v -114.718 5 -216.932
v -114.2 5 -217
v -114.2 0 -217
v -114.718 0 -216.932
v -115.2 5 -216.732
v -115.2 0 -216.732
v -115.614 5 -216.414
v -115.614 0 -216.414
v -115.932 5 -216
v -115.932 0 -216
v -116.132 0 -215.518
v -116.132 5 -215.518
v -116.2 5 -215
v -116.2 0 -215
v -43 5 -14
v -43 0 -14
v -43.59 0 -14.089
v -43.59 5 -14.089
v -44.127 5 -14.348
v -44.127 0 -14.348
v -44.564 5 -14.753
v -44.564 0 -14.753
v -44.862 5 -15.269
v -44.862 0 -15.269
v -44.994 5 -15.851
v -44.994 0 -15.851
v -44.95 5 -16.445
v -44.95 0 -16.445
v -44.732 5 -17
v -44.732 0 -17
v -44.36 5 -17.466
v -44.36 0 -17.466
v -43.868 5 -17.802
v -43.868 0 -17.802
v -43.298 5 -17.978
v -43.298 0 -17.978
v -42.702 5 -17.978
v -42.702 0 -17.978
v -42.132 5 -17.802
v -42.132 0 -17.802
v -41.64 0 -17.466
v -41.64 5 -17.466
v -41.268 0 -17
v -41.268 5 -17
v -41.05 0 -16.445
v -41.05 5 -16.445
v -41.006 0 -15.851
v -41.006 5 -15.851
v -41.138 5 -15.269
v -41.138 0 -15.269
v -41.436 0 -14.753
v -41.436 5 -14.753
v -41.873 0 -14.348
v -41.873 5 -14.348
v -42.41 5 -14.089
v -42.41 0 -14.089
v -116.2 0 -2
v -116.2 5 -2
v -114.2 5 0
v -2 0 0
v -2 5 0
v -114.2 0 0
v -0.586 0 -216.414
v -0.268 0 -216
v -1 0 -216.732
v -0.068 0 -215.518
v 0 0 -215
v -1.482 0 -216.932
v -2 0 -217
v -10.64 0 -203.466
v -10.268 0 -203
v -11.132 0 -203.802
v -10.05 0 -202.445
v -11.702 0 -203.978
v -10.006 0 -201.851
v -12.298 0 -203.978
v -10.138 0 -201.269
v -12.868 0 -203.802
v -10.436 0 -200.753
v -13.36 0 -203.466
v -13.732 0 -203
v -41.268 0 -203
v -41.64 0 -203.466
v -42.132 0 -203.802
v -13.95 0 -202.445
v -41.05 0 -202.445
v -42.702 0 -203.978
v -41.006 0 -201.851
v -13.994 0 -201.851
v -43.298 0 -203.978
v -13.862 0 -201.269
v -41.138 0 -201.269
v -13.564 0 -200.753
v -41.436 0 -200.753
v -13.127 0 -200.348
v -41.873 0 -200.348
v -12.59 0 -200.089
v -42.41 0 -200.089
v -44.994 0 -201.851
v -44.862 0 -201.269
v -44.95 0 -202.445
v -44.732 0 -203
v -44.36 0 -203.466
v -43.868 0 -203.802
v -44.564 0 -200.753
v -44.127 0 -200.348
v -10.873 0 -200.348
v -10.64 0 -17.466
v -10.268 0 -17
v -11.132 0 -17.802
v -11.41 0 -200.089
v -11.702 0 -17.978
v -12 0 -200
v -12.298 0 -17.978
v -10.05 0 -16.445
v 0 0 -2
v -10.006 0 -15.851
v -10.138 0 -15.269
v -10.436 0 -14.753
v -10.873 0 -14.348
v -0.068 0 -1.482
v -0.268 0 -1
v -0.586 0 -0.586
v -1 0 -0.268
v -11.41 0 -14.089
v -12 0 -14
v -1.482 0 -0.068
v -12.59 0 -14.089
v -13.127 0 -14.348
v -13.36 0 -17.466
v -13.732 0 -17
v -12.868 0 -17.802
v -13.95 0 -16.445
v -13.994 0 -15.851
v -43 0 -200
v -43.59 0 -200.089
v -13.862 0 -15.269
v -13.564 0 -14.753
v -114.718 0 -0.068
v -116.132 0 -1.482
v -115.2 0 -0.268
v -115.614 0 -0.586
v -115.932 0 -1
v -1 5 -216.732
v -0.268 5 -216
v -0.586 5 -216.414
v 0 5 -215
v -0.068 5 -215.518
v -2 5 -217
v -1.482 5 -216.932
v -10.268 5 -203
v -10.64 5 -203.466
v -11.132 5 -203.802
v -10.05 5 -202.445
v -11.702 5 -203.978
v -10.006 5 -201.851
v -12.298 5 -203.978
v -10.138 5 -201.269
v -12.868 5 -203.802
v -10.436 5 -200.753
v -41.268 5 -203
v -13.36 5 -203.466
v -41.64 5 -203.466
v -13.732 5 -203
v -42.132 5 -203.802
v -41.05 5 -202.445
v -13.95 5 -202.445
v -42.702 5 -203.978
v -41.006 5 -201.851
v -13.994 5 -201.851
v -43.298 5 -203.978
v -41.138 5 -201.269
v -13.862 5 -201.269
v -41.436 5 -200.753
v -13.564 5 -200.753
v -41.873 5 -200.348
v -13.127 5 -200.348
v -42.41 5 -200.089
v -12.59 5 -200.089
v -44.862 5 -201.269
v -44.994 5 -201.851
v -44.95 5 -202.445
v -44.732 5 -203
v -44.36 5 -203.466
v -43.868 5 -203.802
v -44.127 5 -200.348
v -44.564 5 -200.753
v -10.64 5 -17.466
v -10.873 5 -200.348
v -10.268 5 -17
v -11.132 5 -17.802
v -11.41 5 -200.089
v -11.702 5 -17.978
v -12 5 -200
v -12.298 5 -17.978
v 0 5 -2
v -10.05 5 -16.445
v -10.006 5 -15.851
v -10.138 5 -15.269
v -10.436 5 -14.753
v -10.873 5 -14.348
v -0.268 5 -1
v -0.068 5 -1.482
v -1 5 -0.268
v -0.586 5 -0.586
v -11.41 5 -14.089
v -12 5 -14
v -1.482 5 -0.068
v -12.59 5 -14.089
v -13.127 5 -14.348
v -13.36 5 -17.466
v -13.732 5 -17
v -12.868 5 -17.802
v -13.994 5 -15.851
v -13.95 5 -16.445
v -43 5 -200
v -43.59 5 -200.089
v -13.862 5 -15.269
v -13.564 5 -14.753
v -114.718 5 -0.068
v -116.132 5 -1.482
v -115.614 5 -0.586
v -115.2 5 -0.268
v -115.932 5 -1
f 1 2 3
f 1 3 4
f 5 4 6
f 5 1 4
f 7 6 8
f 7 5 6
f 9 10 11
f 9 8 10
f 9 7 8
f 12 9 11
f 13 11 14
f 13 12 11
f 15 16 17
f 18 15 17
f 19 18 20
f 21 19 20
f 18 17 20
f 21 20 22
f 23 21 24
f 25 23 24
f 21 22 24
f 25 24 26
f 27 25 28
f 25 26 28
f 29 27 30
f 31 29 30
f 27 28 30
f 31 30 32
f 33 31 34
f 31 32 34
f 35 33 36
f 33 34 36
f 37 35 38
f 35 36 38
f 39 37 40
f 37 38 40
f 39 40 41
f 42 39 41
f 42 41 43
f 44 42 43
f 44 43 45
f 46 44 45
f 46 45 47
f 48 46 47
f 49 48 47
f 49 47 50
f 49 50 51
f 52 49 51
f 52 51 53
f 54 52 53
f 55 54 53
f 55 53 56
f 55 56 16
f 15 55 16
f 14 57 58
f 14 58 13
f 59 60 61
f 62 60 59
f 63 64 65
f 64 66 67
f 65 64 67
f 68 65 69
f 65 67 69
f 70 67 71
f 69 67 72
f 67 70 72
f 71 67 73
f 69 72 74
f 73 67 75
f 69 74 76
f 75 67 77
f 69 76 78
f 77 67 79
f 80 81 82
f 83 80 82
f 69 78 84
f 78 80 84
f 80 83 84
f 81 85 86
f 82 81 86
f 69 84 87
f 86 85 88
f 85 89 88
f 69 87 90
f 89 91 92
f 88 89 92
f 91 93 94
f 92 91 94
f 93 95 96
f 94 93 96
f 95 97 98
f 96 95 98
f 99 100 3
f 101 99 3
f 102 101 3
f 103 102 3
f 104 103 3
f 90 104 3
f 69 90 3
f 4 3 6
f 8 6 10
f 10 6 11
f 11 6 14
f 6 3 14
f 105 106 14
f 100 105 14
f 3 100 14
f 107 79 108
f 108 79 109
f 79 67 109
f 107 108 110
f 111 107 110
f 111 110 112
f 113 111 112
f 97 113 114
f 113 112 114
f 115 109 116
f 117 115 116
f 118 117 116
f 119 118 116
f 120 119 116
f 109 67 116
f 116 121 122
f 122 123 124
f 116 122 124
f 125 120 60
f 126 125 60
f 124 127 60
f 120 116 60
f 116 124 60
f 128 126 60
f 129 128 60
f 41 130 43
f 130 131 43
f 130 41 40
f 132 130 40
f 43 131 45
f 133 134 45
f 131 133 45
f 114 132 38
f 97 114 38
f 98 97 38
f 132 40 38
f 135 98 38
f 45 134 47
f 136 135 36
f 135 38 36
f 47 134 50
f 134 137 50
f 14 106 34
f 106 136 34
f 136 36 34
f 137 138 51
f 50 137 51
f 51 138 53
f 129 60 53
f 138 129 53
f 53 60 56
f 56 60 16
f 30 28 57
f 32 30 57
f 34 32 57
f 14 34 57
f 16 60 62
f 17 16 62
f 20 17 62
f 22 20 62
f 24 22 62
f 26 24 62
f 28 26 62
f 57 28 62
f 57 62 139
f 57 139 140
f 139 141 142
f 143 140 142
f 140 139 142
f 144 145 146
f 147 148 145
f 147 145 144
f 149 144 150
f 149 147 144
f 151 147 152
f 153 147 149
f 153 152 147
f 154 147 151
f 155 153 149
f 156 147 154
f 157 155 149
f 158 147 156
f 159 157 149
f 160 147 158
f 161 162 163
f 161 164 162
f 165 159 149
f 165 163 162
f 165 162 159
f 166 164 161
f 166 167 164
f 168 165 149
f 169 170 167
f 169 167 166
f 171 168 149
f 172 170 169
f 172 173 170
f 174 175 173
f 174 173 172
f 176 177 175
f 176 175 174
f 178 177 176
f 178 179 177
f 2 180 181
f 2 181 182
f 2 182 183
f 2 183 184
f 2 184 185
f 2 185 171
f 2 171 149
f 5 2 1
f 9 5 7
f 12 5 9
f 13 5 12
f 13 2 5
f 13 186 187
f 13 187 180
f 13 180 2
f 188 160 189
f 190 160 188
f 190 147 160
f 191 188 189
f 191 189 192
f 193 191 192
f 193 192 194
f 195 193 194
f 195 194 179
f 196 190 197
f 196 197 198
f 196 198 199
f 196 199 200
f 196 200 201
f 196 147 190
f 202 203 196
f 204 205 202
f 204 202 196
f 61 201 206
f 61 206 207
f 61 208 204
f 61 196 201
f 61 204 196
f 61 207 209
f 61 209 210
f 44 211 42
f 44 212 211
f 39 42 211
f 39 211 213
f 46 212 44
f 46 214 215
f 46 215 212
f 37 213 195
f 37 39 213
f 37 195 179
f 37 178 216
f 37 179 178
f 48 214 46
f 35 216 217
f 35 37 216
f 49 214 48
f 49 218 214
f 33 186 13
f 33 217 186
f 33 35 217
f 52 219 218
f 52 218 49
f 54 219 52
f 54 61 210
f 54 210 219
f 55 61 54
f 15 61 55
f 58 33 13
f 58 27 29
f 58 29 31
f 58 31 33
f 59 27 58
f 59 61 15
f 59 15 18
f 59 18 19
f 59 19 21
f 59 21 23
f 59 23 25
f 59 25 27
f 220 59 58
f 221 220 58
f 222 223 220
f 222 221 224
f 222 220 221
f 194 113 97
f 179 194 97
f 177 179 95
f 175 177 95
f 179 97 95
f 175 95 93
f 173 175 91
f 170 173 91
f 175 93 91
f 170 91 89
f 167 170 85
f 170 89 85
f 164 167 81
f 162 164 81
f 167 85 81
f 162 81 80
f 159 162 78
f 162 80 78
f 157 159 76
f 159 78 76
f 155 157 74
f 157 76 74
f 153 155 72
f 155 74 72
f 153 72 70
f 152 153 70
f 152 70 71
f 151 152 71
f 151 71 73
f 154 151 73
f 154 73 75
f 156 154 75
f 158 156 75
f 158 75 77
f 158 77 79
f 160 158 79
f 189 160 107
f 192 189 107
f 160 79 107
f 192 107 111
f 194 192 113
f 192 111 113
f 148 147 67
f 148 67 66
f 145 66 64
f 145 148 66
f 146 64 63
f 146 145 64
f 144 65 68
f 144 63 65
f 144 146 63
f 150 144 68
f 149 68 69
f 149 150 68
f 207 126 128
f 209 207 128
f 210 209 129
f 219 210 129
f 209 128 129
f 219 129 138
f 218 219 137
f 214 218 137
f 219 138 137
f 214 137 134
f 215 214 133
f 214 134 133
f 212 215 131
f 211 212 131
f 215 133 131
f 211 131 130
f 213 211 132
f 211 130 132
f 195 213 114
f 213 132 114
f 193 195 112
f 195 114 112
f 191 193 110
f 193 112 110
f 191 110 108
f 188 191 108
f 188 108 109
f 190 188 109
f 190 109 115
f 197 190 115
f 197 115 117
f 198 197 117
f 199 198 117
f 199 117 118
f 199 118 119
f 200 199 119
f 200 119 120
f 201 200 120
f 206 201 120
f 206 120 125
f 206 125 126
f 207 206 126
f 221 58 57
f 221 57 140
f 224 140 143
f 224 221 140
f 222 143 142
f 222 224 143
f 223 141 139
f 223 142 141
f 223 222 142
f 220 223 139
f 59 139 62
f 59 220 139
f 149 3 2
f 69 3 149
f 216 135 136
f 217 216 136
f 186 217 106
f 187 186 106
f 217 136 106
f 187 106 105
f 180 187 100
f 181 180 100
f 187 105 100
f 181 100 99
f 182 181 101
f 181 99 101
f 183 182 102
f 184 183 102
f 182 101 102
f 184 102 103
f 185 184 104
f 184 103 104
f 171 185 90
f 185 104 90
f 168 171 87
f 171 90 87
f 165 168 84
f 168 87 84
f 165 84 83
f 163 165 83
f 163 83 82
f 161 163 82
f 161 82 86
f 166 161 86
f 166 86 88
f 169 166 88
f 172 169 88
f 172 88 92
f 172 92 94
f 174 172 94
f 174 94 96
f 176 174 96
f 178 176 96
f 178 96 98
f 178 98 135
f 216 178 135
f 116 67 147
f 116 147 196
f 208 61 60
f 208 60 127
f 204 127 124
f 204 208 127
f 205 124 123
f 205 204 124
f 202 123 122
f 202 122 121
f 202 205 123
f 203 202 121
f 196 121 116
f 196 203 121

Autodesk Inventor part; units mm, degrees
ref_plane "YZ Plane" through (0, 0, 0) normal (1, 0, 0) x (0, 1, 0)
ref_plane "XZ Plane" through (0, 0, 0) normal (0, 1, 0) x (-1, 0, 0)
ref_plane "XY Plane" through (0, 0, 0) normal (0, 0, 1) x (1, 0, 0)
sketch "Sketch1" plane through (0, 0, 0) normal (0, 1, 0) x (-1, 0, 0)
  line L0 (0, 0) -> (111.2, 0)
  line L1 (116.2, 0) -> (116.2, -217)
  line L2 (116.2, -217) -> (0, -217)
  line L3 (0, -217) -> (0, 0)
  line L4 (111.2, 0) -> (111.2, 0)
  line L5 (111.2, 0) -> (116.2, 0)
  dimension "d4" = 5
  dimension "d5" = 111.2
  dimension "d6" = 217
  dimension "d7" = 217
extrude "Extrusion1" add sketch "Sketch1" along normal blind 5
fillet "Fillet1" radius 2 5 edges at (-111.2, 2.5, 0) (0, 2.5, 0) (-116.2, 2.5, 0) (0, 2.5, -217) (-116.2, 2.5, -217)
sketch "Sketch2" plane through (0, 5, 0) normal (0, 1, 0) x (1, 0, 0)
  line L0 (-12, -58.0921) -> (-12, 320.7627) construction
  line L1 (-43, -58.0921) -> (-43, 320.7627) construction
  line L2 (-149.1257, 202) -> (35.6079, 202) construction
  line L3 (-154.8253, 16) -> (27.8967, 16) construction
  line L4 (-114.2, 16) -> (-113.2, 16) construction
  line L5 (0, 2) -> (0, 215) projected
  point P0 (0, 0)
  point P1 (-43, 16)
  point P2 (-12, 16)
  point P3 (-43, 202)
  point P4 (-12, 202)
  dimension "d12" = 186
  dimension "d20" = 12
  dimension "d21" = 31
hole "Hole1" at (-43, 5, -16) at (-12, 5, -16) at (-43, 5, -202) at (-12, 5, -202) direction (0, -1, 0) diameter 4 end through all
properties part number "Central Divider"
